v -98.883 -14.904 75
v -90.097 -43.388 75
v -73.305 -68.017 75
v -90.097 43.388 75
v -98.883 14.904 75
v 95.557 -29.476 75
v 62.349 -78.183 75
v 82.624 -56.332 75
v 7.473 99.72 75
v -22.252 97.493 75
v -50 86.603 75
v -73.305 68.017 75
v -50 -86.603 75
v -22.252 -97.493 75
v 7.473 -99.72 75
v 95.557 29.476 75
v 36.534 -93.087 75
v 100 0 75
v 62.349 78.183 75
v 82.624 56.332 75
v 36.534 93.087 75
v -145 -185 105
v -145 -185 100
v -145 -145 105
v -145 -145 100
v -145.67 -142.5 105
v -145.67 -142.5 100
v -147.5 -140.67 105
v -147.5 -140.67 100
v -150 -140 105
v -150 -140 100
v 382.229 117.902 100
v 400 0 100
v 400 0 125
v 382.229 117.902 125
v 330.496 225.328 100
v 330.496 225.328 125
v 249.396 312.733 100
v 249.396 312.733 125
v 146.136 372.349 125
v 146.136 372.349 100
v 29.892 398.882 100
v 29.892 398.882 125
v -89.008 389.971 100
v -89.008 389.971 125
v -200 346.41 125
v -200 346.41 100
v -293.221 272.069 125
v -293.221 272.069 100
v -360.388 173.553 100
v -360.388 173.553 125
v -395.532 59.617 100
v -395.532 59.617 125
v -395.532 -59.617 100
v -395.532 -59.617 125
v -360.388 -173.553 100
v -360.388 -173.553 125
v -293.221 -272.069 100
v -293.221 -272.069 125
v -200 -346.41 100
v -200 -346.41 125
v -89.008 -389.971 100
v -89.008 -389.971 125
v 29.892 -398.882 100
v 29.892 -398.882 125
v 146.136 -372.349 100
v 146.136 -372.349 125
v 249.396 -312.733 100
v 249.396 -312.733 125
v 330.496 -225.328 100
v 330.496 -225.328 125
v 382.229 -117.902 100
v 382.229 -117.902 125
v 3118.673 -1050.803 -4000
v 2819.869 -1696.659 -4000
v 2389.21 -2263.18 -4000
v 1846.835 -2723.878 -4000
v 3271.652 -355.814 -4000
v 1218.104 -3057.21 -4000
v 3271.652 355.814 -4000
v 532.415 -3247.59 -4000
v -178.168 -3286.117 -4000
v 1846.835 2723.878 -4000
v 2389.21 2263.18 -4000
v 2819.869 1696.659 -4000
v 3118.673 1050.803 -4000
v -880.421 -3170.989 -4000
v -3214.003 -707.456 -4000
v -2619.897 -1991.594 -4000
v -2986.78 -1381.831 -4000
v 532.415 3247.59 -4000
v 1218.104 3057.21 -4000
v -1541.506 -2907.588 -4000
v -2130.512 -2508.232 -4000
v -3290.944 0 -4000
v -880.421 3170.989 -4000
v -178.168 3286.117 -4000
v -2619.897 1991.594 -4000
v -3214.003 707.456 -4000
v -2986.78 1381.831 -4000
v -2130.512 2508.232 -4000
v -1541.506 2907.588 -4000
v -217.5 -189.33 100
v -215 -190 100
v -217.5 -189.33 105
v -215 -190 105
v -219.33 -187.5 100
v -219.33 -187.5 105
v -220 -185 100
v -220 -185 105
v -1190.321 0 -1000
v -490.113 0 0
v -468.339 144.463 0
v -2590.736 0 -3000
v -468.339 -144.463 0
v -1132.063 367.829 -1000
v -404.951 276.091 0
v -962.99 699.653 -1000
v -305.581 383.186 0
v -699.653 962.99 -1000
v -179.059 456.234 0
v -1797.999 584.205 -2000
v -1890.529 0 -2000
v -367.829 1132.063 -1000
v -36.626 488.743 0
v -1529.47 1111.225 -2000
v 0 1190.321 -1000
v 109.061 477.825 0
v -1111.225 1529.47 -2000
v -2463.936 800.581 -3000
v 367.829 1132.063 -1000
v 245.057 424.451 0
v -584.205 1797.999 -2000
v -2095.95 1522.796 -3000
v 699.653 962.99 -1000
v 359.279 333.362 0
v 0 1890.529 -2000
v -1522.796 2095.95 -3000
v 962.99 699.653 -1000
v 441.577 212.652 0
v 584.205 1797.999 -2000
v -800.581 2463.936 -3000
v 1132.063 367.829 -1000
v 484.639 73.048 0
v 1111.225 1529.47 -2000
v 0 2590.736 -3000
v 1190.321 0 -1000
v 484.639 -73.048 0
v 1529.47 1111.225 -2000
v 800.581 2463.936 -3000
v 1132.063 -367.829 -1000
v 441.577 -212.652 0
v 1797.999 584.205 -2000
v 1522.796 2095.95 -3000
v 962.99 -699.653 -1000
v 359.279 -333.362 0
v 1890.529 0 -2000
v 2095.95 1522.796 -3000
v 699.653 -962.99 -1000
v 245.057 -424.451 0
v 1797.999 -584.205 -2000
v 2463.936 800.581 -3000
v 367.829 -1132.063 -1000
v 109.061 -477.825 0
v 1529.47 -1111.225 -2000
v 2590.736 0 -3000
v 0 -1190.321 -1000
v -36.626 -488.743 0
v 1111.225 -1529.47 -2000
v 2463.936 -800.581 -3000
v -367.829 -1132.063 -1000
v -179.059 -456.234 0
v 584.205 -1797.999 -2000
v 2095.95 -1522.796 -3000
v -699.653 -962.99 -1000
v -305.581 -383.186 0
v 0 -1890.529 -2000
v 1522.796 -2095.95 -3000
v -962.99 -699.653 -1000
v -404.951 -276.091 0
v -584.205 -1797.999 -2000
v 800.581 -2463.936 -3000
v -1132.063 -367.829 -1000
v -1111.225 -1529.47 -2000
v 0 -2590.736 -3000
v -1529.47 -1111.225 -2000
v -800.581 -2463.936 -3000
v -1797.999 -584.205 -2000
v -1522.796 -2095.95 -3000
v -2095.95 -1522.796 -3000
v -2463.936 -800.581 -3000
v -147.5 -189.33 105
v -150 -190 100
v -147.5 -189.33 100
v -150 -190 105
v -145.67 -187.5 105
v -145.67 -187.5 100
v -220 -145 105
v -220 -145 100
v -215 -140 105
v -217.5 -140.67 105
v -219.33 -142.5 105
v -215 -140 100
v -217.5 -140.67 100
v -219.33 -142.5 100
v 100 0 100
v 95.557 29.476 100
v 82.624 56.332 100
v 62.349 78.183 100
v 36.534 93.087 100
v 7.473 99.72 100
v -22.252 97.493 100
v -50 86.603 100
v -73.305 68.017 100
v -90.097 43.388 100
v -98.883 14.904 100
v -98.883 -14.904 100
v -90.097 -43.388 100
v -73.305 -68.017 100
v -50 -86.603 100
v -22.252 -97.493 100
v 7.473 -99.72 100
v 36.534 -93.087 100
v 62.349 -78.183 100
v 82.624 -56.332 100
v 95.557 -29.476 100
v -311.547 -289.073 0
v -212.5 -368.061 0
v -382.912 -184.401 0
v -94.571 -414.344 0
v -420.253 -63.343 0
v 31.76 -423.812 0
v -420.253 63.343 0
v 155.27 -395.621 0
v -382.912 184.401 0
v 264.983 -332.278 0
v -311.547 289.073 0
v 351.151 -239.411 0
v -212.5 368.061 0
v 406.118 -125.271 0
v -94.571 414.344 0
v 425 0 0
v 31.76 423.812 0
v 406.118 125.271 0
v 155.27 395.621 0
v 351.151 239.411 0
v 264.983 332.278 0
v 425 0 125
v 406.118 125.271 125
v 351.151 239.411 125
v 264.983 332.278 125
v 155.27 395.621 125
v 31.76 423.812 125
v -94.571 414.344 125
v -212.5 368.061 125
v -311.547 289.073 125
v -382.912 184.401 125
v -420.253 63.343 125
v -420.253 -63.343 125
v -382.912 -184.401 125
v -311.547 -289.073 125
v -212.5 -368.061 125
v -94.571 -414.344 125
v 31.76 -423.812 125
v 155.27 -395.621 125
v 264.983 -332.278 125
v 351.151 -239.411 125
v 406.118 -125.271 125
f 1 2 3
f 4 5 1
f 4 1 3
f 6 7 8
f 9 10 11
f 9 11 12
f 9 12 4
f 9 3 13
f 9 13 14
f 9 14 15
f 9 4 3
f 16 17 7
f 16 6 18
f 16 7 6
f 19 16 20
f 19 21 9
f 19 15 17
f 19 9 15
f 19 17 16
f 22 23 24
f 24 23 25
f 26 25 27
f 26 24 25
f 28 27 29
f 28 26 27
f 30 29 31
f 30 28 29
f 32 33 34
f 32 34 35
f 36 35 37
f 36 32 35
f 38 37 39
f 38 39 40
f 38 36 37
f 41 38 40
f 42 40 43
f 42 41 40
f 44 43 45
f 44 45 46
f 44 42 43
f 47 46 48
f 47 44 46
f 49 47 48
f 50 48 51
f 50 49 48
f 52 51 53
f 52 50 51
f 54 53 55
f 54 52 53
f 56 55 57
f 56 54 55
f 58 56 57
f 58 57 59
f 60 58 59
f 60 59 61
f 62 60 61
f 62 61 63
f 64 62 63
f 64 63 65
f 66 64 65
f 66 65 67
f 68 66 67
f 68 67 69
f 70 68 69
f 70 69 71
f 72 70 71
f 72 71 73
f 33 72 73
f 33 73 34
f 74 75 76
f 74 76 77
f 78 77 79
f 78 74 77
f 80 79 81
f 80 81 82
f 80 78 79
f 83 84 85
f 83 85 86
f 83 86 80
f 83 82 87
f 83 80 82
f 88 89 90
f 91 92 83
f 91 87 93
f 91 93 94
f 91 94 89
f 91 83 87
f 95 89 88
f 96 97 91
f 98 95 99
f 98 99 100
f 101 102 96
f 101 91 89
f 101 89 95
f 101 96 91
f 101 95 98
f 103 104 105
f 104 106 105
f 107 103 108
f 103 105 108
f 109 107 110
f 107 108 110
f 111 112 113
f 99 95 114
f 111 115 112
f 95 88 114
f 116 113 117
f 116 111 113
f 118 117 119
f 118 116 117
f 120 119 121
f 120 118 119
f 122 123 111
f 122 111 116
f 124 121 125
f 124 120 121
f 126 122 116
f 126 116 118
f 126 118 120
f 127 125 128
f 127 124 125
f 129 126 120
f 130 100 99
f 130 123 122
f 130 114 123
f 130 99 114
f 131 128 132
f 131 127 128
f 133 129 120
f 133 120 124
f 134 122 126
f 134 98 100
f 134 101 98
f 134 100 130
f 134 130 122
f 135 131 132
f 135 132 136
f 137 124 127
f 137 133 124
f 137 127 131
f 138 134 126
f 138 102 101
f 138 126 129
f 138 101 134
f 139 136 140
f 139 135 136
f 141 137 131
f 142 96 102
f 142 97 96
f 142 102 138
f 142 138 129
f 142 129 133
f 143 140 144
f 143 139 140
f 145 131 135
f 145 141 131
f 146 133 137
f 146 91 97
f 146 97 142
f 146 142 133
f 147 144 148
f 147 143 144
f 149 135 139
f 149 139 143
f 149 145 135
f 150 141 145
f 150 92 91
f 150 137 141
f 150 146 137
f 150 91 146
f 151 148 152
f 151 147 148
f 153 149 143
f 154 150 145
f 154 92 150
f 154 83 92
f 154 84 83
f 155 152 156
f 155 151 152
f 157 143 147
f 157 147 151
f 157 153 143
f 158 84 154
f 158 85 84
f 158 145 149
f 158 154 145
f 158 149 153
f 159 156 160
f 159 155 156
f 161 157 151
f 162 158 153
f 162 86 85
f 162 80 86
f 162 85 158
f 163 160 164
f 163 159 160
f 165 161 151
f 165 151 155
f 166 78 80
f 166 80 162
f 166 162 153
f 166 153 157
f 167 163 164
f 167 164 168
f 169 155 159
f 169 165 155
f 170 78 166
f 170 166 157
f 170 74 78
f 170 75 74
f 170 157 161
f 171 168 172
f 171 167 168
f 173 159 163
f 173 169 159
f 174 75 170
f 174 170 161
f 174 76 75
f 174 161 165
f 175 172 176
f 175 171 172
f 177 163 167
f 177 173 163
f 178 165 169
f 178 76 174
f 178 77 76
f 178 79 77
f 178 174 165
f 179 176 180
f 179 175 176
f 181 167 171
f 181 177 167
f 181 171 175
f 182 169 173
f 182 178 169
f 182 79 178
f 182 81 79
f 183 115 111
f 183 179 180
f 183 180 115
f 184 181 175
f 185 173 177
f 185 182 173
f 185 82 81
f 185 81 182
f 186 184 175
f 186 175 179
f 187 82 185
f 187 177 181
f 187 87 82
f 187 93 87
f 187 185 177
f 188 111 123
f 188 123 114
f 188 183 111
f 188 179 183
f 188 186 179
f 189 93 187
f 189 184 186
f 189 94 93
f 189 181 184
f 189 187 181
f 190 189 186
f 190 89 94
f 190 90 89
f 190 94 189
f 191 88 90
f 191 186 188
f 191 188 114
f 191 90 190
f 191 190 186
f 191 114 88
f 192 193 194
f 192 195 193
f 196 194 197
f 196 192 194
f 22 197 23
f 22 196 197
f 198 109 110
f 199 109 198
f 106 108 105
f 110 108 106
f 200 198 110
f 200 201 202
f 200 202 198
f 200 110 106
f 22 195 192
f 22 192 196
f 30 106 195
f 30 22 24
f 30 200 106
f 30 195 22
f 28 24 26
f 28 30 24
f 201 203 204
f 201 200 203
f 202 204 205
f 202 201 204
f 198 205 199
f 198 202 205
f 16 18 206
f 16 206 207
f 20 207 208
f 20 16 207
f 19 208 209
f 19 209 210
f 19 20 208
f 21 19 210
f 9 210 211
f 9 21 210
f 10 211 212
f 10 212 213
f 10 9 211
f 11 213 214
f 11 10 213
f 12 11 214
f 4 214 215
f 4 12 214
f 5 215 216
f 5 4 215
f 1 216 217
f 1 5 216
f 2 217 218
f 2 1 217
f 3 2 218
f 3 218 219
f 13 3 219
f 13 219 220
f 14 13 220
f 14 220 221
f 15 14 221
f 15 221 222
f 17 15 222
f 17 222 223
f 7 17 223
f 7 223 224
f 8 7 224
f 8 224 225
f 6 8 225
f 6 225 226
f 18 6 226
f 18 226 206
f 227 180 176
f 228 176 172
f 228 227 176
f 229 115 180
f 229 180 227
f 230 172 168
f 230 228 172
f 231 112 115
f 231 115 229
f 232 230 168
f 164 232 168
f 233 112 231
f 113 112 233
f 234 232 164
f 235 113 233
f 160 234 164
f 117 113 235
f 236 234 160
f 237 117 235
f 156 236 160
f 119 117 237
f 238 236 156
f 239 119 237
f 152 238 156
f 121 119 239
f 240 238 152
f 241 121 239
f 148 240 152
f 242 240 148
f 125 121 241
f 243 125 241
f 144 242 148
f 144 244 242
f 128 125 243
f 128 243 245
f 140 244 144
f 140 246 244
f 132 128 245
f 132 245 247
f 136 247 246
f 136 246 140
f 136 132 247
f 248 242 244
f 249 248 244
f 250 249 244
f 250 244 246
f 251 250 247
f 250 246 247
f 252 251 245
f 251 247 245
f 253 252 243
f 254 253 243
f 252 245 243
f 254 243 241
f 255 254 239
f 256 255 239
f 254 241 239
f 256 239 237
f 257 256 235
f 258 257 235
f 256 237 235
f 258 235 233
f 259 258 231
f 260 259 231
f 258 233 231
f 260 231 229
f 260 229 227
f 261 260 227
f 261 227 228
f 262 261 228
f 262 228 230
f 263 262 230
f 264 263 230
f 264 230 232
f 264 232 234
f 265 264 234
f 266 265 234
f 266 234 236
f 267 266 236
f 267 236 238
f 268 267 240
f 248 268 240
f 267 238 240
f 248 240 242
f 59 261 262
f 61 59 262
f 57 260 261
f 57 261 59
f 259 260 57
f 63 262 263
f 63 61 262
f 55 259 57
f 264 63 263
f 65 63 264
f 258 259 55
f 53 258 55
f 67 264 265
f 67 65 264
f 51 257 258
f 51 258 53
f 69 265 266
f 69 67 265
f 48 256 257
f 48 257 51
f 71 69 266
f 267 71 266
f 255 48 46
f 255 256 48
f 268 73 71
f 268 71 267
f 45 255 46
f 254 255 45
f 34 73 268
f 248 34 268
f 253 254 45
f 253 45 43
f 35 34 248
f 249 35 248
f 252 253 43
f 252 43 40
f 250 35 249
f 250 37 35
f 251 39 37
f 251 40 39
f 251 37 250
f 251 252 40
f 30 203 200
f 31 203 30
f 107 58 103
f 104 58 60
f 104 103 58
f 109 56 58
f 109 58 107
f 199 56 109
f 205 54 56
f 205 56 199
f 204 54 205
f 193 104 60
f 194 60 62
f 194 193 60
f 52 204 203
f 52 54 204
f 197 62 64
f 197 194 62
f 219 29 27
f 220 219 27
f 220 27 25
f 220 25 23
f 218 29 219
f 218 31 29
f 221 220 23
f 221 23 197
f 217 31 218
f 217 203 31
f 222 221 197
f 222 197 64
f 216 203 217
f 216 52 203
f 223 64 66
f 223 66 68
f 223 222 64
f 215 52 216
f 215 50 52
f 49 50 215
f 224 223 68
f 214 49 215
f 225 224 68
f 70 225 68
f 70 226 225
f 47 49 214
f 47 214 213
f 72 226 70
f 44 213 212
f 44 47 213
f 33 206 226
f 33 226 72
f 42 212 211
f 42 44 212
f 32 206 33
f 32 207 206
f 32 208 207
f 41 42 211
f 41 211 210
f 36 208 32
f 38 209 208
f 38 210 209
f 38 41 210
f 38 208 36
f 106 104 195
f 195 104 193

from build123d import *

# Parameters (mm, degrees)
CROQUIS1_R              = 400
CROQUIS1_R_2            = 100
SALIENTE_EXTRUIR1_DEPTH = 100
CROQUIS2_R              = 425
CROQUIS2_R_2            = 400
SALIENTE_EXTRUIR2_DEPTH = 125
CROQUIS3_R              = 100
SALIENTE_EXTRUIR3_DEPTH = 75
CROQUIS5_W              = 75
CROQUIS5_H              = 50
SALIENTE_EXTRUIR4_DEPTH = 5
REDONDEO1_R             = 5


with BuildPart() as part:
    # Croquis1 → Saliente-Extruir1 (new body)
    with BuildSketch(Plane.XY):
        Circle(CROQUIS1_R)
        Circle(CROQUIS1_R_2, mode=Mode.SUBTRACT)
    extrude(amount=SALIENTE_EXTRUIR1_DEPTH)



with BuildPart() as body_2:
    # Croquis2 → Saliente-Extruir2 (new body)
    with BuildSketch(Plane.XY):
        Circle(CROQUIS2_R)
        Circle(CROQUIS2_R_2, mode=Mode.SUBTRACT)
    extrude(amount=SALIENTE_EXTRUIR2_DEPTH)


with BuildPart() as body_3:
    # Croquis3 → Saliente-Extruir3 (new body)
    with BuildSketch(Plane.XY):
        Circle(CROQUIS3_R)
    extrude(amount=SALIENTE_EXTRUIR3_DEPTH)


with BuildPart() as part_1:
    add(part.part)

    add(body_2.part)  # Saliente-Extruir4 merges body 2
    # Croquis5 → Saliente-Extruir4 (add)
    with BuildSketch(Plane.XY.offset(100)):
        with Locations((-182.5, -165)):
            Rectangle(CROQUIS5_W, CROQUIS5_H)
    extrude(amount=SALIENTE_EXTRUIR4_DEPTH)

    # Redondeo1
    redondeo1_edges = [part_1.edges().sort_by_distance(p)[0] for p in [
        (-220, -140, 102.5),
        (-220, -190, 102.5),
        (-145, -190, 102.5),
        (-145, -140, 102.5),
    ]]
    fillet(redondeo1_edges, radius=REDONDEO1_R)


    add(body_3.part)  # Revolución2 merges body 3
    # Croquis6 → Revolución2 (revolve)
    with BuildSketch(Plane(origin=(0, 0, 0), x_dir=(1, 0, 0), z_dir=(0, 1, 0))):
        Polygon((-490.113460198, 0), (-3290.943613037, 4000), (0, 4000), (0, 0), align=None)
    revolve(axis=Axis((0, 0, 0), (0, 0, -1)))


solid = part_1.part
